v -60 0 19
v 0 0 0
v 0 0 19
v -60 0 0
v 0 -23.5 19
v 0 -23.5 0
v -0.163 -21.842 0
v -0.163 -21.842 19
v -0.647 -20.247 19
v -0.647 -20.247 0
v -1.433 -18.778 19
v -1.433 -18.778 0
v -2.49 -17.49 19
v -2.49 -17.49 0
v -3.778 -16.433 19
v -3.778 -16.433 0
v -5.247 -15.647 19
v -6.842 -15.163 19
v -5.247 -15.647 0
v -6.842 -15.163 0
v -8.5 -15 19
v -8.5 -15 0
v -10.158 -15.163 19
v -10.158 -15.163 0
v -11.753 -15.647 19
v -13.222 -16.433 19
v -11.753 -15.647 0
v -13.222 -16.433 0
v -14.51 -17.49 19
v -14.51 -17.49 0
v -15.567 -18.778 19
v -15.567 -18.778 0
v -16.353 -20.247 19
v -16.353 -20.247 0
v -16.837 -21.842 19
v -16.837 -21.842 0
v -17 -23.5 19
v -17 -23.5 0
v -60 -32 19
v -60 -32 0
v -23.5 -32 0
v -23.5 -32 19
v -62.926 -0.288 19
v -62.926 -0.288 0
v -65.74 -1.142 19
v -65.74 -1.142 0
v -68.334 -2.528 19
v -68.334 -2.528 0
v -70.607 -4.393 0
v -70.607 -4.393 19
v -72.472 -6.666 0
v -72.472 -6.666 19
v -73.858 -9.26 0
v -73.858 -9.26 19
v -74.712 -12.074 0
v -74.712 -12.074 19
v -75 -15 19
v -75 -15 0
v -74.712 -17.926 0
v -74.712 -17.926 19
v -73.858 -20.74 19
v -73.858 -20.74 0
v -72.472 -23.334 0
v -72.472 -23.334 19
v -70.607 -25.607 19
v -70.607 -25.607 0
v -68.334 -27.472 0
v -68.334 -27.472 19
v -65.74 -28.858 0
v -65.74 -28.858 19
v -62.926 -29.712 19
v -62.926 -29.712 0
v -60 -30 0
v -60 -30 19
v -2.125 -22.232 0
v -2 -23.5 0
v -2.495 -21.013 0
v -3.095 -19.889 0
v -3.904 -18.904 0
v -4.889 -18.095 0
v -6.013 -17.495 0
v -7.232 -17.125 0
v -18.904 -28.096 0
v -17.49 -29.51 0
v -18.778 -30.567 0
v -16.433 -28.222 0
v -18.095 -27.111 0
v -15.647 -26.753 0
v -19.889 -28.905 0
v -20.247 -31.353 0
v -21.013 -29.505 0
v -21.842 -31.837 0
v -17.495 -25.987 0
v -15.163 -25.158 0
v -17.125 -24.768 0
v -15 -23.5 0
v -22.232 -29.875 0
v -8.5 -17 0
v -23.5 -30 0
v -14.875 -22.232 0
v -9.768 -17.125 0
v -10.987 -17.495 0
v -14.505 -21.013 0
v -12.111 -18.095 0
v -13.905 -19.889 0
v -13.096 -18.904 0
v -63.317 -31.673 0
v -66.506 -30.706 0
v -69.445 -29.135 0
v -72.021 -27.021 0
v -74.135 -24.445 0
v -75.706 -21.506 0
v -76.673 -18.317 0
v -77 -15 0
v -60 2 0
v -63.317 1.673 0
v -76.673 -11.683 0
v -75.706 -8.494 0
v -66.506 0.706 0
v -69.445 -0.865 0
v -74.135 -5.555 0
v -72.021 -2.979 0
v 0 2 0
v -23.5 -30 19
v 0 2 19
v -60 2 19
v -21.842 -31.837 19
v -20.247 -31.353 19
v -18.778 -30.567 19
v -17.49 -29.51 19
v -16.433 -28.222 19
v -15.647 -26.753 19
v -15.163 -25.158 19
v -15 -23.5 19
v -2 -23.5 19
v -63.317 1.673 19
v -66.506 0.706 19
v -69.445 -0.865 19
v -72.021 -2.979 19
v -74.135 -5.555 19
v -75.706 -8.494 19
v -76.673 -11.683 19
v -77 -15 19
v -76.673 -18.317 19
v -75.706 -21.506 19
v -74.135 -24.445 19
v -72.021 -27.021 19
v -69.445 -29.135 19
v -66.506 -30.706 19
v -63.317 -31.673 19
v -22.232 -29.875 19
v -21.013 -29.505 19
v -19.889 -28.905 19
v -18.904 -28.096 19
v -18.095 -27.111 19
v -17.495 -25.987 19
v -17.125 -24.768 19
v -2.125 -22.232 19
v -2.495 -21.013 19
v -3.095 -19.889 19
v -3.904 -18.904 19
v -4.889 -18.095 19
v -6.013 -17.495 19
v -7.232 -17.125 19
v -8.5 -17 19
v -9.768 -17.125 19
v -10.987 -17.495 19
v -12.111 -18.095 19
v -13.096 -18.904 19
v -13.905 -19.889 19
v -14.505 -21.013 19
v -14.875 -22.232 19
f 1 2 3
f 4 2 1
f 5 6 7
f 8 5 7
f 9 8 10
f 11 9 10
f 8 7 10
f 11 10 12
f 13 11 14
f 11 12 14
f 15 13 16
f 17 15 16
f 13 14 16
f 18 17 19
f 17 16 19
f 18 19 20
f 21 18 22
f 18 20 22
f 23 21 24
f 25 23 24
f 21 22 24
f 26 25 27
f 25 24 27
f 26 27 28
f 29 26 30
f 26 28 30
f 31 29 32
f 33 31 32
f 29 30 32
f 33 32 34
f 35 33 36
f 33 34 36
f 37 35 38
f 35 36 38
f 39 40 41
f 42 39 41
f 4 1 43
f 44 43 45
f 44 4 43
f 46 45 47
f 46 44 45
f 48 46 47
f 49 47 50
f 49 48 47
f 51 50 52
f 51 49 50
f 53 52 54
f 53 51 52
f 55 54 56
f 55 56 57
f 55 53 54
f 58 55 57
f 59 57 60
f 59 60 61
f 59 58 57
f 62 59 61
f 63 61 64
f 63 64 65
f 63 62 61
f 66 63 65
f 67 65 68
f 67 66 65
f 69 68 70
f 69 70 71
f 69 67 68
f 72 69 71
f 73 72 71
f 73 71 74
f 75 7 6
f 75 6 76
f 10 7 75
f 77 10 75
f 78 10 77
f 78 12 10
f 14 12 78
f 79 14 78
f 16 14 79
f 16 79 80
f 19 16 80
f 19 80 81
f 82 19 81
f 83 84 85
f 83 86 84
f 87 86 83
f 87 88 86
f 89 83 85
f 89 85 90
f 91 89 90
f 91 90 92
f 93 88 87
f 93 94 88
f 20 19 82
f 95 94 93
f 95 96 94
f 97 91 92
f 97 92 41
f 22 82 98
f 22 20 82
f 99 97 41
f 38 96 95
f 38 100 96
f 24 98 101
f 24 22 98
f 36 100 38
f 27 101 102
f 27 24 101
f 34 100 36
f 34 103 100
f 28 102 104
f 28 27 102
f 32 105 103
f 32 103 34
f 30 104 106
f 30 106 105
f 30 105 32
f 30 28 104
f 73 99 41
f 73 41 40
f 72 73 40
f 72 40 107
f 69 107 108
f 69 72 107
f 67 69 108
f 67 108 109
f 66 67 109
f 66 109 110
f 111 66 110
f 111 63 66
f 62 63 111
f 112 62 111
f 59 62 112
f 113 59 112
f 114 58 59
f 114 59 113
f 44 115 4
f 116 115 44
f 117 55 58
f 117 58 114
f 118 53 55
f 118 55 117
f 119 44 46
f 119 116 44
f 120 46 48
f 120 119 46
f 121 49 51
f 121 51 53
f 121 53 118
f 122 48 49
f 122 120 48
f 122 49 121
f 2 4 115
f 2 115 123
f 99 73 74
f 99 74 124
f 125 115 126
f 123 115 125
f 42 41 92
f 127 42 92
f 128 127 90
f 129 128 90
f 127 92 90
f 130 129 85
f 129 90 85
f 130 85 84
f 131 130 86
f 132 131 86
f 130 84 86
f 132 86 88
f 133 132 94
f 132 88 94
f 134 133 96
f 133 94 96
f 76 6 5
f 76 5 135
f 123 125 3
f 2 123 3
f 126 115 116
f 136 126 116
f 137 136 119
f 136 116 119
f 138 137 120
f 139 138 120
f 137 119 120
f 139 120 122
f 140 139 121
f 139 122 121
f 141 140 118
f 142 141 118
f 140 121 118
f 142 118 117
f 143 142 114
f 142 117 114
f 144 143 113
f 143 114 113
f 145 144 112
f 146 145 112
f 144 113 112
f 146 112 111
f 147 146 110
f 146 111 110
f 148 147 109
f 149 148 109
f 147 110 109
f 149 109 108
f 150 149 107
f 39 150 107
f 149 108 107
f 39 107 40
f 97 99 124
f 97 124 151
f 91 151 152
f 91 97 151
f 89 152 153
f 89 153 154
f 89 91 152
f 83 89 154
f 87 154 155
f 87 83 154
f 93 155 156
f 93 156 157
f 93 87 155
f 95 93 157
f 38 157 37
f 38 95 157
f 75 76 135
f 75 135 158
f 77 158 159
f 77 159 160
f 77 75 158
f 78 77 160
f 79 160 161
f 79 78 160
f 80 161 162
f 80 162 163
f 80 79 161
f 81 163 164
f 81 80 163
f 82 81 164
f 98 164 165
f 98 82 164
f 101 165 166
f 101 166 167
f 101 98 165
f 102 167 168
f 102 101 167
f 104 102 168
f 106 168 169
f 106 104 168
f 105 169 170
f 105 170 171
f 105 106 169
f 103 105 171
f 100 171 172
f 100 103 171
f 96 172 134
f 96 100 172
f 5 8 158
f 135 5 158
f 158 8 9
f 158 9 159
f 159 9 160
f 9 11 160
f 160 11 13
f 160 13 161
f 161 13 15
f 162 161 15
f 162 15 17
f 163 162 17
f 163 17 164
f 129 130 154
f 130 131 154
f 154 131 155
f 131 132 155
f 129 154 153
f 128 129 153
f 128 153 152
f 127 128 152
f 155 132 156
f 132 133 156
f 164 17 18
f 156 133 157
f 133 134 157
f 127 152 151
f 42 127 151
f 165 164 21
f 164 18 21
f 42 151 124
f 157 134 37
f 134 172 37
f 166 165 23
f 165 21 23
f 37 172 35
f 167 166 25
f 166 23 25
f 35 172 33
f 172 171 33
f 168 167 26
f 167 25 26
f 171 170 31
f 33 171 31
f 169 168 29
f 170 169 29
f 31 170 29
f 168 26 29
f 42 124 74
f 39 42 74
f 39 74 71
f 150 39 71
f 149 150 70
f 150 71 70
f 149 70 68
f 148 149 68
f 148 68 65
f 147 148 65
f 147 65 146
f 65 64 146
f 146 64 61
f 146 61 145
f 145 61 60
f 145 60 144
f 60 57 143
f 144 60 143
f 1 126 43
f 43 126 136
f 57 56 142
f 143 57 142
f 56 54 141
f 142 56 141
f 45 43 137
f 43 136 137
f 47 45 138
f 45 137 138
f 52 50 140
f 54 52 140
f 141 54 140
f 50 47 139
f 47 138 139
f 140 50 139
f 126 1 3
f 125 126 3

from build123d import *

# Parameters (mm, degrees)
PAD_DEPTH = 19


with BuildPart() as part:
    # Sketch → Pad (new body)
    with BuildSketch(Plane.XY):
        with BuildLine():
            Line((0, 0), (-60, 0))
            ThreePointArc((-60, 0), (-75, -15), (-60, -30))
            Line((-60, -30), (-23.5, -30))
            ThreePointArc((-23.5, -30), (-18.903806, -28.096194), (-17, -23.5))
            ThreePointArc((0, -23.5), (-8.5, -15), (-17, -23.5))
            Line((0, -23.5), (-2, -23.5))
            ThreePointArc((-2, -23.5), (-8.5, -17), (-15, -23.5))
            ThreePointArc((-23.5, -32), (-17.489592, -29.510408), (-15, -23.5))
            Line((-60, -32), (-23.5, -32))
            ThreePointArc((-60, 2), (-77, -15), (-60, -32))
            Line((-60, 2), (0, 2))
            Line((0, 2), (0, 0))
        make_face()
    extrude(amount=PAD_DEPTH)


solid = part.part
